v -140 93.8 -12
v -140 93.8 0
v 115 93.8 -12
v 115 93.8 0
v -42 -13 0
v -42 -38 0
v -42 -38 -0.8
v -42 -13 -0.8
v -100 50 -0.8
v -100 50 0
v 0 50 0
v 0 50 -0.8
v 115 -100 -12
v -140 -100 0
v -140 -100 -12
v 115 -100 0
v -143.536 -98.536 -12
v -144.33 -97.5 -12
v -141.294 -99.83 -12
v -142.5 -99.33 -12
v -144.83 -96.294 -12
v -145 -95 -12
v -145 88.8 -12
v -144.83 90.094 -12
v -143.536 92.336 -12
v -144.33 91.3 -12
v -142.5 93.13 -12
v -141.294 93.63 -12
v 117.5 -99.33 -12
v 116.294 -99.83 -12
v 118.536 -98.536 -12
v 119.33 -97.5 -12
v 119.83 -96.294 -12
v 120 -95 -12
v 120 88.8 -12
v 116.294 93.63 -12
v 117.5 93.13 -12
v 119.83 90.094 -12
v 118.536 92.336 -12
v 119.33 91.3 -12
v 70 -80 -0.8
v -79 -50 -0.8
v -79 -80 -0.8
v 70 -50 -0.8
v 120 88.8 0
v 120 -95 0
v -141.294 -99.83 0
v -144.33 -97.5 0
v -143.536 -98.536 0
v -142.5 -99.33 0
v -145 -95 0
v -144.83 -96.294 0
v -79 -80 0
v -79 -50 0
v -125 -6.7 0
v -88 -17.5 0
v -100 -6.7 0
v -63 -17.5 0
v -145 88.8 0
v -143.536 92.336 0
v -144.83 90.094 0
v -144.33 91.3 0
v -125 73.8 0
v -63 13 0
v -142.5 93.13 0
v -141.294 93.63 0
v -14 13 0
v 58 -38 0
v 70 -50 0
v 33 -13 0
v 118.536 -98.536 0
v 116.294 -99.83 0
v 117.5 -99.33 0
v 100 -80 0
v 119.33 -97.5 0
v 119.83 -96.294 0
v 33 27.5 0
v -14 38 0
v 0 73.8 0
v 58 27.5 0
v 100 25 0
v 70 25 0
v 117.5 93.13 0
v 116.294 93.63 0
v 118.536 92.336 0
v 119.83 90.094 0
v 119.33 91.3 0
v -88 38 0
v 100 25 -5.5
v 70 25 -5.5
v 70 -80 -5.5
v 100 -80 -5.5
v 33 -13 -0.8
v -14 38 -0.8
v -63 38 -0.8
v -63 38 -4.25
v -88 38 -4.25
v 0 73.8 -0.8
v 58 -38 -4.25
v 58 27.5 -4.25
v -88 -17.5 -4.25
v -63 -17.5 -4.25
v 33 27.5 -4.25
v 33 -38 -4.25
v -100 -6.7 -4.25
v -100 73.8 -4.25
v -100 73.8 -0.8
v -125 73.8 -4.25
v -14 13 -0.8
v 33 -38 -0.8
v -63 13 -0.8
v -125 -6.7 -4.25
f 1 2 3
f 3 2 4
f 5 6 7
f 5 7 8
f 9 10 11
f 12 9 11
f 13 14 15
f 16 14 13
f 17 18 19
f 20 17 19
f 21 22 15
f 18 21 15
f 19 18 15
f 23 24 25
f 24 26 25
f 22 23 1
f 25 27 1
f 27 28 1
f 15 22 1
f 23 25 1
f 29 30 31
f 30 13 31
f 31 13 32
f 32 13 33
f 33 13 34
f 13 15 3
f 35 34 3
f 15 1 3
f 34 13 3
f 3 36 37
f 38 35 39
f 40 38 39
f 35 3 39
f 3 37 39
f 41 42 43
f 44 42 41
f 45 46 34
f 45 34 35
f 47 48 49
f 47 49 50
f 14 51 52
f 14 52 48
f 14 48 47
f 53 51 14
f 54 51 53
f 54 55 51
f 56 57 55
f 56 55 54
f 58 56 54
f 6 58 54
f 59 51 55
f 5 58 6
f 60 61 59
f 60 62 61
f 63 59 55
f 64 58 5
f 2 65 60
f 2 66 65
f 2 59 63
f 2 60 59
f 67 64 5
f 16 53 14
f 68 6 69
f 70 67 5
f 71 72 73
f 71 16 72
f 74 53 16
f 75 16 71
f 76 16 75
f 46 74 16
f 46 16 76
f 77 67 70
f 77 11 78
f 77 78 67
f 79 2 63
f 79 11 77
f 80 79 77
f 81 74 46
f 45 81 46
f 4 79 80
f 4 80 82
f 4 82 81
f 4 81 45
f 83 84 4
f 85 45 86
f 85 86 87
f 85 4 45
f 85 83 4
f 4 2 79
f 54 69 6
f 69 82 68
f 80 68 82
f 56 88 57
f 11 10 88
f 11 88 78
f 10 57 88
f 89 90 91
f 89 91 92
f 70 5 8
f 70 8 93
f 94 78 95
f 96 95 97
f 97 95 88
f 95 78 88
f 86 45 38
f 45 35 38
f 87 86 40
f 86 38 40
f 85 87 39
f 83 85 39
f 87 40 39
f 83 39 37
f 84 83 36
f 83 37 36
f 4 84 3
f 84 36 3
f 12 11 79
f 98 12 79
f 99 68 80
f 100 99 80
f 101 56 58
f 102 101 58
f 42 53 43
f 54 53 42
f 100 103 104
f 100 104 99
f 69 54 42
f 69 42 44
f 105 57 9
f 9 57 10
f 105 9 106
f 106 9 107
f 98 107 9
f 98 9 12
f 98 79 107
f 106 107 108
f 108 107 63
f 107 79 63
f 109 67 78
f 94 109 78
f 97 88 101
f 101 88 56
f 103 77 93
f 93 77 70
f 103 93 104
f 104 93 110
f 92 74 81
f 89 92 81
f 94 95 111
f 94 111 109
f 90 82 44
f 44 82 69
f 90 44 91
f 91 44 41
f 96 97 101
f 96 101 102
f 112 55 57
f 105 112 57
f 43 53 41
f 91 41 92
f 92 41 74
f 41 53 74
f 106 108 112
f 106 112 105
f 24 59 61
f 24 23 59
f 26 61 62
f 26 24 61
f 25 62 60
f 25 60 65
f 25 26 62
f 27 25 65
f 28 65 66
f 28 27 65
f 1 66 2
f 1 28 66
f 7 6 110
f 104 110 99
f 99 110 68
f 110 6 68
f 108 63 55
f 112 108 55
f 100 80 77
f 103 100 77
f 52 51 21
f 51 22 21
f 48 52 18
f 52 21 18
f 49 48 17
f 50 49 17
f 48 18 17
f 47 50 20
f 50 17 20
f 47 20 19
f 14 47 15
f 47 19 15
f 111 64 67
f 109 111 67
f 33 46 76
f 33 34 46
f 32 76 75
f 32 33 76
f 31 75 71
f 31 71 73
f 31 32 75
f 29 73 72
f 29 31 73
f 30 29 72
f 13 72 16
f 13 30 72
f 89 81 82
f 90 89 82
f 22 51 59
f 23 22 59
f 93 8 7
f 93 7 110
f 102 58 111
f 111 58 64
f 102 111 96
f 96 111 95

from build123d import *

# Parameters (mm, degrees)
F1_W     = 265
F1_H     = 193.8
F2_DEPTH = 12
F0_W     = 100
F0_H     = 23.8
F0_W_2   = 49
F0_H_2   = 25
F0_W_3   = 75
F0_W_4   = 149
F0_H_3   = 30
F3_DEPTH = 0.8
F4_DEPTH = 4.25
F5_DEPTH = 5.5
F6_R     = 5


with BuildPart() as f2:
    # F1 (on Top) → F2 (new body)
    with BuildSketch(Plane.XY):
        with Locations((-12.5, -3.1)):
            Rectangle(F1_W, F1_H)
    extrude(amount=-F2_DEPTH)

    # F0 (on Top) → F3 (cut)
    with BuildSketch(Plane.XY):
        Polygon((-100, 73.8), (-125, 73.8), (-125, -6.7), (-100, -6.7), (-100, 50), align=None)
        with Locations((-50, 61.9)):
            Rectangle(F0_W, F0_H)
        Polygon((-63, 38), (-88, 38), (-88, -17.5), (-63, -17.5), (-63, 13), align=None)
        with Locations((-38.5, 25.5)):
            Rectangle(F0_W_2, F0_H_2)
        Polygon((58, 27.5), (33, 27.5), (33, -13), (33, -38), (58, -38), align=None)
        with Locations((-4.5, -25.5)):
            Rectangle(F0_W_3, F0_H_2)
        Polygon((100, -80), (100, 25), (70, 25), (70, -50), (70, -80), align=None)
        with Locations((-4.5, -65)):
            Rectangle(F0_W_4, F0_H_3)
    extrude(amount=-F3_DEPTH, mode=Mode.SUBTRACT)

    # F0 (on Top) → F4 (cut)
    with BuildSketch(Plane.XY):
        Polygon((58, 27.5), (33, 27.5), (33, -13), (33, -38), (58, -38), align=None)
        Polygon((-63, 38), (-88, 38), (-88, -17.5), (-63, -17.5), (-63, 13), align=None)
        Polygon((-100, 73.8), (-125, 73.8), (-125, -6.7), (-100, -6.7), (-100, 50), align=None)
    extrude(amount=-F4_DEPTH, mode=Mode.SUBTRACT)

    # F0 (on Top) → F5 (cut)
    with BuildSketch(Plane.XY):
        Polygon((100, -80), (100, 25), (70, 25), (70, -50), (70, -80), align=None)
    extrude(amount=-F5_DEPTH, mode=Mode.SUBTRACT)

    # F6
    f6_edges = [f2.edges().sort_by_distance(p)[0] for p in [
        (-145, -100, -6),
        (120, -100, -6),
        (120, 93.8, -6),
        (-145, 93.8, -6),
    ]]
    fillet(f6_edges, radius=F6_R)


solid = f2.part
